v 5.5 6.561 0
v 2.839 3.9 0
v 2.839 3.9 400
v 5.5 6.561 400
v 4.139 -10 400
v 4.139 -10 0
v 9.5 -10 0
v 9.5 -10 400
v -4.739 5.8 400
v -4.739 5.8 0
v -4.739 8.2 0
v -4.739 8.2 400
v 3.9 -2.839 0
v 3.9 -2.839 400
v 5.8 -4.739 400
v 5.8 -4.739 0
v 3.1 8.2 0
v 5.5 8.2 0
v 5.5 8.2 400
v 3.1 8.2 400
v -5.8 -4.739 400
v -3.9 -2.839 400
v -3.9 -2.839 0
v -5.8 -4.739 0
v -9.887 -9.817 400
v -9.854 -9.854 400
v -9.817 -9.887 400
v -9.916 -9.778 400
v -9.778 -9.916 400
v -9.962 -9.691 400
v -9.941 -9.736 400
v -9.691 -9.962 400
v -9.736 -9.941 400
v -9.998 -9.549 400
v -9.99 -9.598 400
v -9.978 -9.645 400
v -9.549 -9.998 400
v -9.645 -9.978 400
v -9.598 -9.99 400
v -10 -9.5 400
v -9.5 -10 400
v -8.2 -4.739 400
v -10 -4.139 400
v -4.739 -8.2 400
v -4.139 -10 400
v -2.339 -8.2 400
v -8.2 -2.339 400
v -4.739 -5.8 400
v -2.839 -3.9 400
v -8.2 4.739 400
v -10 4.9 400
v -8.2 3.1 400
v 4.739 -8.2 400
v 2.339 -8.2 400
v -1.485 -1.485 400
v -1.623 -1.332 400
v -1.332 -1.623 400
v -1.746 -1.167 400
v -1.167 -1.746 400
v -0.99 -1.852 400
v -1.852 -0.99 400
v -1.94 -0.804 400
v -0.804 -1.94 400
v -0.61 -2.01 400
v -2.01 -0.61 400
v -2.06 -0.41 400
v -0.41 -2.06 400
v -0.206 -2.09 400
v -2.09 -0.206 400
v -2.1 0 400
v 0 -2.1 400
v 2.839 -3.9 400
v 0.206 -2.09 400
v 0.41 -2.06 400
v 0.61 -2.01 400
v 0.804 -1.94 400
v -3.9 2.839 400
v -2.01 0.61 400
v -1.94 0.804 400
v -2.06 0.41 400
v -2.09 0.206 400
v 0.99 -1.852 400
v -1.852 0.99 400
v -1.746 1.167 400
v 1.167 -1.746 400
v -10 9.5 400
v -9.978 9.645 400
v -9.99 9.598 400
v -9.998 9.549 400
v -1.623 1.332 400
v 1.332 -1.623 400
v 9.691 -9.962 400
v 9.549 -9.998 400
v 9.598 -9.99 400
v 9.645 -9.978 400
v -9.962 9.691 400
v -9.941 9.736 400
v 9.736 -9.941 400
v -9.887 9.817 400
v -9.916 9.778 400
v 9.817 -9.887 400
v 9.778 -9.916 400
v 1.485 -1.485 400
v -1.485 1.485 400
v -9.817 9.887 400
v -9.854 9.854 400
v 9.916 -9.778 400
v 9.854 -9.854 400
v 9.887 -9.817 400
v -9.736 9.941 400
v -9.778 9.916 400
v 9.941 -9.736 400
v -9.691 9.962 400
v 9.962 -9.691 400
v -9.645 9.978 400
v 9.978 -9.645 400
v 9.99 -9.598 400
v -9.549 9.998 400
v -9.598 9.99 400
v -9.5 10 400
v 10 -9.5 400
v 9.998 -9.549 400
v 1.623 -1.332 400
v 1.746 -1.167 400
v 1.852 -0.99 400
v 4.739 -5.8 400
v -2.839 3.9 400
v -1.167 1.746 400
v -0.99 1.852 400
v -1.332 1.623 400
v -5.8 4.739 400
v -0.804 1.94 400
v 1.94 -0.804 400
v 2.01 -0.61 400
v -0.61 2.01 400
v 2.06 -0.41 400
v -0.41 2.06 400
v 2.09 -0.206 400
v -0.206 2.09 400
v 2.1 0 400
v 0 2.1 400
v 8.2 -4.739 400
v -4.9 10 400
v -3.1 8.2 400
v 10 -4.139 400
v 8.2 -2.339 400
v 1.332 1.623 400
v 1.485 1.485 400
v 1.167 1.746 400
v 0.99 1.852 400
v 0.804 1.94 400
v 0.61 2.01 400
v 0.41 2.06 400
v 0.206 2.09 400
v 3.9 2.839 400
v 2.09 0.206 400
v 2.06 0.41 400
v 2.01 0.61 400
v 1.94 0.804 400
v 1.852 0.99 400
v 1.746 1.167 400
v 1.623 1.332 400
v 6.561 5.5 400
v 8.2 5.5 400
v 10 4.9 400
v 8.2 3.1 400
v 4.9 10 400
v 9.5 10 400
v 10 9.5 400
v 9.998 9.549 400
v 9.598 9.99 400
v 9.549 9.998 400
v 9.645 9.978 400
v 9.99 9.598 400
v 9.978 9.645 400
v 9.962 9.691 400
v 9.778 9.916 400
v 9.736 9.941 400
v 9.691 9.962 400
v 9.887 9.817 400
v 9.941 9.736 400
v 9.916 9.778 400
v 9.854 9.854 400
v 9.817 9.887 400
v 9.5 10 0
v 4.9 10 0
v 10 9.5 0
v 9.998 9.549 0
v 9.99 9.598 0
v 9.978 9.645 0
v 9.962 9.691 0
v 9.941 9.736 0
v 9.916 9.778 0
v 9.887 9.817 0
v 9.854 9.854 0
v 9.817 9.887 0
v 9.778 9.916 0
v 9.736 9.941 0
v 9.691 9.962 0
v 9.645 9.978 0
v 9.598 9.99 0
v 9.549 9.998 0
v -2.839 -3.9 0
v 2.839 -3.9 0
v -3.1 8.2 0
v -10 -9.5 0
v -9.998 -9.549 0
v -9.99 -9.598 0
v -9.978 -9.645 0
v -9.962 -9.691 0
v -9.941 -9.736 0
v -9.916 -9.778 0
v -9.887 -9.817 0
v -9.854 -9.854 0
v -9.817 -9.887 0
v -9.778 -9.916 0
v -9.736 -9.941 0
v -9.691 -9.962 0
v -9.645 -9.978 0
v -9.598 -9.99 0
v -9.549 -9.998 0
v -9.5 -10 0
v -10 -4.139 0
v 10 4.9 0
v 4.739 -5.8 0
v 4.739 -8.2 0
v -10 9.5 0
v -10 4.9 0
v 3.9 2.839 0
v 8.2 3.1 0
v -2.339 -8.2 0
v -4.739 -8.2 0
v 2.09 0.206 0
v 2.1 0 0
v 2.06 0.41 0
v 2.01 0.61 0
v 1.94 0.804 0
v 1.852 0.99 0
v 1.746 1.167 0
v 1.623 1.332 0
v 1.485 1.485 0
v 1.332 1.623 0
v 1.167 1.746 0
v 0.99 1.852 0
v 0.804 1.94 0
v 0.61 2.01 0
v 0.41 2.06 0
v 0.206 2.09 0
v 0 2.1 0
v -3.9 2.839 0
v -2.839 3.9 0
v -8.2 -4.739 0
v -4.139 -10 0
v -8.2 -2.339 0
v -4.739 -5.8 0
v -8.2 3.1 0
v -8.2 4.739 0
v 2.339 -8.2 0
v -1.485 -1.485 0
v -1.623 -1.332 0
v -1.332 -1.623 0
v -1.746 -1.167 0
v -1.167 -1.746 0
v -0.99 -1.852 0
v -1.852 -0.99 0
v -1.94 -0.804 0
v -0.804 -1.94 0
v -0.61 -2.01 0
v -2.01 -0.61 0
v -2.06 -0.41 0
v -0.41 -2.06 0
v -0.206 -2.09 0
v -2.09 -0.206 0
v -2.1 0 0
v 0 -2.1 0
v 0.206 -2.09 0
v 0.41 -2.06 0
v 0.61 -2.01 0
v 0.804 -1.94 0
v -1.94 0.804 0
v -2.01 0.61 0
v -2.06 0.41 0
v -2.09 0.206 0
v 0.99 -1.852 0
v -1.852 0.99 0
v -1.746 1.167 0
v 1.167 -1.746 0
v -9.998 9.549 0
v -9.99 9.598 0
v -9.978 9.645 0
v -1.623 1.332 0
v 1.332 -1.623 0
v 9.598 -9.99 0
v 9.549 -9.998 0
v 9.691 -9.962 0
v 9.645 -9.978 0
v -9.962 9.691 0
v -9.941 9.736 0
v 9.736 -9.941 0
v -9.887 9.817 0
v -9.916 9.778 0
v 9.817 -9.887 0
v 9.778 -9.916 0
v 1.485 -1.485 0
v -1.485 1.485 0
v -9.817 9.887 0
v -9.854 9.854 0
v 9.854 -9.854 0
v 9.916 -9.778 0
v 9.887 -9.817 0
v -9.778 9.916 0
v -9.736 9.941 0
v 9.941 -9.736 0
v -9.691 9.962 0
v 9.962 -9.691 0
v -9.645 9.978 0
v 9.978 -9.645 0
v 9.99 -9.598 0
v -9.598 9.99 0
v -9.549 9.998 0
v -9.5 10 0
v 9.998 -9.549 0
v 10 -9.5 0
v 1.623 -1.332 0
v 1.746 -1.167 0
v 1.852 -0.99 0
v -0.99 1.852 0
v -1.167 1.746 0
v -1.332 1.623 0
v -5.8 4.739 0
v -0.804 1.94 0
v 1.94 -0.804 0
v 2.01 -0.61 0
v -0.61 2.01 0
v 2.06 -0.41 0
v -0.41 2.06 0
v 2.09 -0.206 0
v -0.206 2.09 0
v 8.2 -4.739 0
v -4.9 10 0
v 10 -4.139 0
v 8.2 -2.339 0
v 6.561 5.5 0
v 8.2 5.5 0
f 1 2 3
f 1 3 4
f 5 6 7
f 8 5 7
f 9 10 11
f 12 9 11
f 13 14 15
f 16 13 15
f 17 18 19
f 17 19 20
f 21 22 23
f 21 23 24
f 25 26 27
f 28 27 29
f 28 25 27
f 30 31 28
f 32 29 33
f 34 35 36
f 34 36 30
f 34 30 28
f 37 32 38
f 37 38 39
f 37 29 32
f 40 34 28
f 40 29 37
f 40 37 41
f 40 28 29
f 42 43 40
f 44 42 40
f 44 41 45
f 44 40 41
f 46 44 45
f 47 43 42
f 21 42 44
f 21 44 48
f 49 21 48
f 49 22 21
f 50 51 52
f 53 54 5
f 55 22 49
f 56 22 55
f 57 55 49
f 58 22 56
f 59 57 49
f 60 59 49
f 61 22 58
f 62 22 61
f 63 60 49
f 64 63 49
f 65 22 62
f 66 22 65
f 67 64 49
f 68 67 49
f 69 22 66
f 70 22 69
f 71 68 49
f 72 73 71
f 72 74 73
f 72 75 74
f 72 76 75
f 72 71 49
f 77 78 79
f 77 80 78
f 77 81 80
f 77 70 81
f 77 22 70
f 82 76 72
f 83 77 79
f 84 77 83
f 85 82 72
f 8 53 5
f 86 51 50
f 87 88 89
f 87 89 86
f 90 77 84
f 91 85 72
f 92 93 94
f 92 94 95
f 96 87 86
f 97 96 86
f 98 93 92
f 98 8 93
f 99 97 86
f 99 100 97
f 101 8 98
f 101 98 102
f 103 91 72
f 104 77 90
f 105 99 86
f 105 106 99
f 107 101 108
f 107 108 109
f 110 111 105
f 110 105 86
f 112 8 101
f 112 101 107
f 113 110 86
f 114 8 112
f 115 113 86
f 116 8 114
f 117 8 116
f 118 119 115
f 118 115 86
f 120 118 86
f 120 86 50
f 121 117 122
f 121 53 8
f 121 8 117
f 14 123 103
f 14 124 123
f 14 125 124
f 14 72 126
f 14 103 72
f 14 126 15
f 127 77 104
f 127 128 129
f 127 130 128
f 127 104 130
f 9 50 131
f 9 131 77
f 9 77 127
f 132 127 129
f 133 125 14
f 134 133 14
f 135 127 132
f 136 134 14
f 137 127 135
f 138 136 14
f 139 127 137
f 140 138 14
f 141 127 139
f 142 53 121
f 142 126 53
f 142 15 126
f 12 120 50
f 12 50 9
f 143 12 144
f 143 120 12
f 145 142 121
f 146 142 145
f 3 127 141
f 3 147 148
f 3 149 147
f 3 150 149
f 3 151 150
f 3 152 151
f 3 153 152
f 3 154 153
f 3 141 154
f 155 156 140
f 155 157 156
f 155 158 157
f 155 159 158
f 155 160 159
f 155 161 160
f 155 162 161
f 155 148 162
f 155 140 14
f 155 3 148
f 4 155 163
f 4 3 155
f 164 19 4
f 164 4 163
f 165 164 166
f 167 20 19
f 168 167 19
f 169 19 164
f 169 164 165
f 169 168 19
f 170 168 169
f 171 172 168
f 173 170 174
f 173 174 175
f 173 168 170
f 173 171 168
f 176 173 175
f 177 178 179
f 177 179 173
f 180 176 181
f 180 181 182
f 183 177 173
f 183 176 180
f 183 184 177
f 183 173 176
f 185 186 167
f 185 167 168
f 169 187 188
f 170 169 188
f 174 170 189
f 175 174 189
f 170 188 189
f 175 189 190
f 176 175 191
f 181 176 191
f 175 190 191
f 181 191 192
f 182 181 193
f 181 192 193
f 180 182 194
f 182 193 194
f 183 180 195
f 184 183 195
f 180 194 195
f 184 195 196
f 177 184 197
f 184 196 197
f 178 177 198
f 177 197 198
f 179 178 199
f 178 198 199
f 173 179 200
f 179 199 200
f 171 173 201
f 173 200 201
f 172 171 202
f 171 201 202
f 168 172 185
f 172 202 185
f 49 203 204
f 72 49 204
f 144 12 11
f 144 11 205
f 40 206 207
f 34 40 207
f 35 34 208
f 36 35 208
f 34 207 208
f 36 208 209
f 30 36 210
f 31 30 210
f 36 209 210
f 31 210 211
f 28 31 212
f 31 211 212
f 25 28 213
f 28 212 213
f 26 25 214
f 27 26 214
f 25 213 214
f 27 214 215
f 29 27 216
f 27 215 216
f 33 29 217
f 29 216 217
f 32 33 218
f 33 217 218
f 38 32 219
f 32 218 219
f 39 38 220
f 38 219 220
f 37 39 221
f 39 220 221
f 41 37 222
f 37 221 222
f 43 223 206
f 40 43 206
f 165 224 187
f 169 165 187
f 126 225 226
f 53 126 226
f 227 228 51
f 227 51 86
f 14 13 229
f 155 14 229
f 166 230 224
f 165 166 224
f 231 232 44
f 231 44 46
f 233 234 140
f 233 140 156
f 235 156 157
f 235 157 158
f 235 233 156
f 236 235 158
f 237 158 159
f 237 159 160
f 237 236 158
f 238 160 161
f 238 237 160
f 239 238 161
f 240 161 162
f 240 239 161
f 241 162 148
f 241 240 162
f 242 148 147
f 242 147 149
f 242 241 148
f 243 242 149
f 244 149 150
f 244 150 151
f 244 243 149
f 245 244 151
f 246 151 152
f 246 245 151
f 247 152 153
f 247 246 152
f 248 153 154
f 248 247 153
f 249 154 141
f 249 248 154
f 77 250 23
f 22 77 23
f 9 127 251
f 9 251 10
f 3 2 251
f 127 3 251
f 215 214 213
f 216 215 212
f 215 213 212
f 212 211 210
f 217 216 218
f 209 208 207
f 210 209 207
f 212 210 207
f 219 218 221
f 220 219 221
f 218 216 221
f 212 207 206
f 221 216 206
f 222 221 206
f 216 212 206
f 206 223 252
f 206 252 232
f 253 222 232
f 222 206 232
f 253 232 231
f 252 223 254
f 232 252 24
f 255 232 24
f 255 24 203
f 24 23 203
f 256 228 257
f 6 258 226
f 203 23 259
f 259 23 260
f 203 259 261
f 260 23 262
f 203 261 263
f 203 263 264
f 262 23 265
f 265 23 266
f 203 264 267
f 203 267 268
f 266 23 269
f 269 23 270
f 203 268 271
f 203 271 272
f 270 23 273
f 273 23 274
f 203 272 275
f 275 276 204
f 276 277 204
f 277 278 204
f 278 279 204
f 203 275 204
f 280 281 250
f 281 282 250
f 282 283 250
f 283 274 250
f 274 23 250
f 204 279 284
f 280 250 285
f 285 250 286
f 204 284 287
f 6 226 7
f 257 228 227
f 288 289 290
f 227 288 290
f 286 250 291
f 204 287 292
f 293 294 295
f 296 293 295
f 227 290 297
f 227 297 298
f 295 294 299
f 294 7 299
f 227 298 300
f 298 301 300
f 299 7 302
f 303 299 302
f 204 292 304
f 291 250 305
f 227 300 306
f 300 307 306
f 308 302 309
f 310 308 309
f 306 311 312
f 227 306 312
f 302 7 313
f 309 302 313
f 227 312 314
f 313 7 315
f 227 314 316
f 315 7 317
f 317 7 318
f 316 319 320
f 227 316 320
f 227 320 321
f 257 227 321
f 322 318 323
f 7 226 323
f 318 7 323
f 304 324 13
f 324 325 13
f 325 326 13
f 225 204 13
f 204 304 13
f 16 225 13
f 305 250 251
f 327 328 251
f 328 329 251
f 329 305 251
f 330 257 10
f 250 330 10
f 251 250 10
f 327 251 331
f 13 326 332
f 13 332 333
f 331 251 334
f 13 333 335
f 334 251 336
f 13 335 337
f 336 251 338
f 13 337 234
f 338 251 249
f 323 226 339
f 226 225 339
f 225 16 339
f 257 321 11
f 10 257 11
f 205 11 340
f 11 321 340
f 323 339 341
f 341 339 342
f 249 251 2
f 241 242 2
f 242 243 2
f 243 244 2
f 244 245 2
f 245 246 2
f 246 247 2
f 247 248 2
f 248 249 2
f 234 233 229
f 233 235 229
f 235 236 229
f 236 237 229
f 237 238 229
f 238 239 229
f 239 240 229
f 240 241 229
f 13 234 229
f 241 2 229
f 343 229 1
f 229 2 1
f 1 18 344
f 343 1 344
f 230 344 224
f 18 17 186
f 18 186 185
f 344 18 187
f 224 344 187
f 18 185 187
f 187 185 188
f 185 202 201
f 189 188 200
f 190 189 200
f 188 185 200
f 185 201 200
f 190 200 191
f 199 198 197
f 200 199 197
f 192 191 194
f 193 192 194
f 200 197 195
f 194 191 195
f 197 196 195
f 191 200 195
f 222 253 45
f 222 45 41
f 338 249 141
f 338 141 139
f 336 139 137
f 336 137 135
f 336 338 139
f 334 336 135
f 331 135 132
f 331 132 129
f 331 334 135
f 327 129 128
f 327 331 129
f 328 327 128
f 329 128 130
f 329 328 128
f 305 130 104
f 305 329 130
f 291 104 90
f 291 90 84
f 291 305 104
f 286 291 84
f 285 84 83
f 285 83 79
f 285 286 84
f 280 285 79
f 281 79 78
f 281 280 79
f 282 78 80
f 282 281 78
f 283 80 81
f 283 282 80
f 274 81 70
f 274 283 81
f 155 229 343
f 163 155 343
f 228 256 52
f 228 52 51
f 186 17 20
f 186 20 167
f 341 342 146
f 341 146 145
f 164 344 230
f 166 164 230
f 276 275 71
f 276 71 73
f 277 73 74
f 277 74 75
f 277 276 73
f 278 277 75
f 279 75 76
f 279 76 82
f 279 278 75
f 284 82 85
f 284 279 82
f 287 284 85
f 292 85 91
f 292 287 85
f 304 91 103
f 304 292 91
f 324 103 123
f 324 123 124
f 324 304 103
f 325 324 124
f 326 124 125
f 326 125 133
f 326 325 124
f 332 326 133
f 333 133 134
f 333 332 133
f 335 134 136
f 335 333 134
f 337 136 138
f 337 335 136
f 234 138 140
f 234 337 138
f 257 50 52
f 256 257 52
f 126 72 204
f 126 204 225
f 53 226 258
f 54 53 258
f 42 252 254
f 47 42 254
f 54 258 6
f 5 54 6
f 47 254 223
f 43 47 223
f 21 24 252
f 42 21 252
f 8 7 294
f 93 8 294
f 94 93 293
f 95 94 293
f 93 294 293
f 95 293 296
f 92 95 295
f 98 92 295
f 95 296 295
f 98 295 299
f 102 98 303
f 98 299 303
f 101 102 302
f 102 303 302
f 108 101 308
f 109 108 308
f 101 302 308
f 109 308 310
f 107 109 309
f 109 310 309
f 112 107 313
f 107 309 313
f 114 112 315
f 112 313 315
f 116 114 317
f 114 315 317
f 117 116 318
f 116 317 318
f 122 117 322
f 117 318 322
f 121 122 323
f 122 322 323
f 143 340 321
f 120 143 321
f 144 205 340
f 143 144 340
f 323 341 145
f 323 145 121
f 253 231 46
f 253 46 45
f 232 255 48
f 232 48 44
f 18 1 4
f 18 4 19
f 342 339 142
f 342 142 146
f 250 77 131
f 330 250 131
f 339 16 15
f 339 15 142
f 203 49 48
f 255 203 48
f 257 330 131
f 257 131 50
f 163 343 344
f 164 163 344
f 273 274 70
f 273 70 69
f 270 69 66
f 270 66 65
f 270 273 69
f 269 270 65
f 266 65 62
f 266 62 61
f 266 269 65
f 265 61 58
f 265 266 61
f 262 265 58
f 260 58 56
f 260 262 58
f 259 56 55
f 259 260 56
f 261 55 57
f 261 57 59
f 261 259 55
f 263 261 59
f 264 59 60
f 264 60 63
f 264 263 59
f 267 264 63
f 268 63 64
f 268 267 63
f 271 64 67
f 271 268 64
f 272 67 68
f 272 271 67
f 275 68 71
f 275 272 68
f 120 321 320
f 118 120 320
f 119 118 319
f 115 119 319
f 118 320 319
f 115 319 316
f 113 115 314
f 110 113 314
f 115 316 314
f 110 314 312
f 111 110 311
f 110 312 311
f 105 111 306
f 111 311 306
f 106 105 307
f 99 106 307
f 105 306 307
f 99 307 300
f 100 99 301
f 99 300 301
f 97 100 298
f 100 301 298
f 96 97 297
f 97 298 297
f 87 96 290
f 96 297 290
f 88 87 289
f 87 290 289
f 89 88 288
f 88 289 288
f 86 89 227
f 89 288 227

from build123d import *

# Parameters (mm, degrees)
PAD_DEPTH = 400


with BuildPart() as part:
    # Sketch → Pad (new body)
    with BuildSketch(Plane.XY):
        with BuildLine():
            Line((3.9, 0), (3.9, 2.83934))
            Line((3.9, 2.83934), (6.56066, 5.5))
            Line((6.56066, 5.5), (8.2, 5.5))
            Line((8.2, 5.5), (8.2, 3.1))
            Line((8.2, 3.1), (10, 4.9))
            Line((10, 4.9), (10, 9.5))
            ThreePointArc((10, 9.5), (9.853553, 9.853553), (9.5, 10))
            Line((4.9, 10), (9.5, 10))
            Line((3.1, 8.2), (4.9, 10))
            Line((5.5, 8.2), (3.1, 8.2))
            Line((5.5, 6.56066), (5.5, 8.2))
            Line((2.83934, 3.9), (5.5, 6.56066))
            Line((2.83934, 3.9), (0, 3.9))
            Line((-2.83934, 3.9), (0, 3.9))
            Line((-2.83934, 3.9), (-4.73934, 5.8))
            Line((-4.73934, 5.8), (-4.73934, 8.2))
            Line((-4.73934, 8.2), (-3.1, 8.2))
            Line((-3.1, 8.2), (-4.9, 10))
            Line((-4.9, 10), (-9.5, 10))
            ThreePointArc((-9.5, 10), (-9.853553, 9.853553), (-10, 9.5))
            Line((-10, 4.9), (-10, 9.5))
            Line((-8.2, 3.1), (-10, 4.9))
            Line((-8.2, 4.73934), (-8.2, 3.1))
            Line((-5.8, 4.73934), (-8.2, 4.73934))
            Line((-3.9, 2.83934), (-5.8, 4.73934))
            Line((-3.9, 0), (-3.9, 2.83934))
            Line((-3.9, 0), (-3.9, -2.83934))
            Line((-3.9, -2.83934), (-5.8, -4.73934))
            Line((-5.8, -4.73934), (-8.2, -4.73934))
            Line((-8.2, -4.73934), (-8.2, -2.33934))
            Line((-8.2, -2.33934), (-10, -4.13934))
            Line((-10, -4.13934), (-10, -9.5))
            ThreePointArc((-10, -9.5), (-9.853553, -9.853553), (-9.5, -10))
            Line((-4.13934, -10), (-9.5, -10))
            Line((-2.33934, -8.2), (-4.13934, -10))
            Line((-4.73934, -8.2), (-2.33934, -8.2))
            Line((-4.73934, -5.8), (-4.73934, -8.2))
            Line((-2.83934, -3.9), (-4.73934, -5.8))
            Line((-2.83934, -3.9), (0, -3.9))
            Line((2.83934, -3.9), (0, -3.9))
            Line((2.83934, -3.9), (4.73934, -5.8))
            Line((4.73934, -5.8), (4.73934, -8.2))
            Line((4.73934, -8.2), (2.33934, -8.2))
            Line((2.33934, -8.2), (4.13934, -10))
            Line((4.13934, -10), (9.5, -10))
            ThreePointArc((9.5, -10), (9.853553, -9.853553), (10, -9.5))
            Line((10, -4.13934), (10, -9.5))
            Line((8.2, -2.33934), (10, -4.13934))
            Line((8.2, -4.73934), (8.2, -2.33934))
            Line((5.8, -4.73934), (8.2, -4.73934))
            Line((3.9, -2.83934), (5.8, -4.73934))
            Line((3.9, 0), (3.9, -2.83934))
        make_face()
        with BuildLine():
            ThreePointArc((2.1, 0), (1.484924, 1.484924), (0, 2.1))
            ThreePointArc((0, 2.1), (-1.484924, 1.484924), (-2.1, 0))
            ThreePointArc((-2.1, 0), (-1.484924, -1.484924), (0, -2.1))
            ThreePointArc((0, -2.1), (1.484924, -1.484924), (2.1, 0))
        make_face(mode=Mode.SUBTRACT)
    extrude(amount=PAD_DEPTH)


solid = part.part
